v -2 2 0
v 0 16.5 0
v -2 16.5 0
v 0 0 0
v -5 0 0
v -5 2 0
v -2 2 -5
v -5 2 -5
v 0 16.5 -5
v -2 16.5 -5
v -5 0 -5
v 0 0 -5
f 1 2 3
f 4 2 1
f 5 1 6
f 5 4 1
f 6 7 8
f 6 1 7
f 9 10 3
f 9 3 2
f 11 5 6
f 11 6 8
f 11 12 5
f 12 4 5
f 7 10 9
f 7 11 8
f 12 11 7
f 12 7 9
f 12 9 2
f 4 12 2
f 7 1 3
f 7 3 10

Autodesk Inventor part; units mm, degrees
ref_plane "YZ Plane" through (0, 0, 0) normal (1, 0, 0) x (0, 1, 0)
ref_plane "XZ Plane" through (0, 0, 0) normal (0, 1, 0) x (-1, 0, 0)
ref_plane "XY Plane" through (0, 0, 0) normal (0, 0, 1) x (1, 0, 0)
sketch "Sketch1" plane through (0, 0, 0) normal (0, 1, 0) x (-1, 0, 0)
  line L0 (0, 0) -> (5, 0)
  line L1 (5, 0) -> (5, -5)
  line L2 (5, -5) -> (0, -5)
  line L3 (0, -5) -> (0, 0)
  dimension "d0" = 5
  dimension "d1" = 5
extrude "Extrusion1" add sketch "Sketch1" along normal blind 2
sketch "Sketch3" plane through (0, 2, 0) normal (0, 1, 0) x (1, 0, 0)
  line L0 (-5, 0) -> (0, 0) projected
  line L1 (0, 5) -> (-5, 5) projected
  line L2 (0, 0) -> (-2, 0)
  line L3 (-2, 0) -> (-2, 5)
  line L4 (-2, 5) -> (0, 5)
  line L5 (0, 5) -> (0, 0)
  dimension "d4" = 2
extrude "Extrusion2" add sketch "Sketch3" along normal blind 14.5
properties part number "Knuckle Stopper - Palm"
